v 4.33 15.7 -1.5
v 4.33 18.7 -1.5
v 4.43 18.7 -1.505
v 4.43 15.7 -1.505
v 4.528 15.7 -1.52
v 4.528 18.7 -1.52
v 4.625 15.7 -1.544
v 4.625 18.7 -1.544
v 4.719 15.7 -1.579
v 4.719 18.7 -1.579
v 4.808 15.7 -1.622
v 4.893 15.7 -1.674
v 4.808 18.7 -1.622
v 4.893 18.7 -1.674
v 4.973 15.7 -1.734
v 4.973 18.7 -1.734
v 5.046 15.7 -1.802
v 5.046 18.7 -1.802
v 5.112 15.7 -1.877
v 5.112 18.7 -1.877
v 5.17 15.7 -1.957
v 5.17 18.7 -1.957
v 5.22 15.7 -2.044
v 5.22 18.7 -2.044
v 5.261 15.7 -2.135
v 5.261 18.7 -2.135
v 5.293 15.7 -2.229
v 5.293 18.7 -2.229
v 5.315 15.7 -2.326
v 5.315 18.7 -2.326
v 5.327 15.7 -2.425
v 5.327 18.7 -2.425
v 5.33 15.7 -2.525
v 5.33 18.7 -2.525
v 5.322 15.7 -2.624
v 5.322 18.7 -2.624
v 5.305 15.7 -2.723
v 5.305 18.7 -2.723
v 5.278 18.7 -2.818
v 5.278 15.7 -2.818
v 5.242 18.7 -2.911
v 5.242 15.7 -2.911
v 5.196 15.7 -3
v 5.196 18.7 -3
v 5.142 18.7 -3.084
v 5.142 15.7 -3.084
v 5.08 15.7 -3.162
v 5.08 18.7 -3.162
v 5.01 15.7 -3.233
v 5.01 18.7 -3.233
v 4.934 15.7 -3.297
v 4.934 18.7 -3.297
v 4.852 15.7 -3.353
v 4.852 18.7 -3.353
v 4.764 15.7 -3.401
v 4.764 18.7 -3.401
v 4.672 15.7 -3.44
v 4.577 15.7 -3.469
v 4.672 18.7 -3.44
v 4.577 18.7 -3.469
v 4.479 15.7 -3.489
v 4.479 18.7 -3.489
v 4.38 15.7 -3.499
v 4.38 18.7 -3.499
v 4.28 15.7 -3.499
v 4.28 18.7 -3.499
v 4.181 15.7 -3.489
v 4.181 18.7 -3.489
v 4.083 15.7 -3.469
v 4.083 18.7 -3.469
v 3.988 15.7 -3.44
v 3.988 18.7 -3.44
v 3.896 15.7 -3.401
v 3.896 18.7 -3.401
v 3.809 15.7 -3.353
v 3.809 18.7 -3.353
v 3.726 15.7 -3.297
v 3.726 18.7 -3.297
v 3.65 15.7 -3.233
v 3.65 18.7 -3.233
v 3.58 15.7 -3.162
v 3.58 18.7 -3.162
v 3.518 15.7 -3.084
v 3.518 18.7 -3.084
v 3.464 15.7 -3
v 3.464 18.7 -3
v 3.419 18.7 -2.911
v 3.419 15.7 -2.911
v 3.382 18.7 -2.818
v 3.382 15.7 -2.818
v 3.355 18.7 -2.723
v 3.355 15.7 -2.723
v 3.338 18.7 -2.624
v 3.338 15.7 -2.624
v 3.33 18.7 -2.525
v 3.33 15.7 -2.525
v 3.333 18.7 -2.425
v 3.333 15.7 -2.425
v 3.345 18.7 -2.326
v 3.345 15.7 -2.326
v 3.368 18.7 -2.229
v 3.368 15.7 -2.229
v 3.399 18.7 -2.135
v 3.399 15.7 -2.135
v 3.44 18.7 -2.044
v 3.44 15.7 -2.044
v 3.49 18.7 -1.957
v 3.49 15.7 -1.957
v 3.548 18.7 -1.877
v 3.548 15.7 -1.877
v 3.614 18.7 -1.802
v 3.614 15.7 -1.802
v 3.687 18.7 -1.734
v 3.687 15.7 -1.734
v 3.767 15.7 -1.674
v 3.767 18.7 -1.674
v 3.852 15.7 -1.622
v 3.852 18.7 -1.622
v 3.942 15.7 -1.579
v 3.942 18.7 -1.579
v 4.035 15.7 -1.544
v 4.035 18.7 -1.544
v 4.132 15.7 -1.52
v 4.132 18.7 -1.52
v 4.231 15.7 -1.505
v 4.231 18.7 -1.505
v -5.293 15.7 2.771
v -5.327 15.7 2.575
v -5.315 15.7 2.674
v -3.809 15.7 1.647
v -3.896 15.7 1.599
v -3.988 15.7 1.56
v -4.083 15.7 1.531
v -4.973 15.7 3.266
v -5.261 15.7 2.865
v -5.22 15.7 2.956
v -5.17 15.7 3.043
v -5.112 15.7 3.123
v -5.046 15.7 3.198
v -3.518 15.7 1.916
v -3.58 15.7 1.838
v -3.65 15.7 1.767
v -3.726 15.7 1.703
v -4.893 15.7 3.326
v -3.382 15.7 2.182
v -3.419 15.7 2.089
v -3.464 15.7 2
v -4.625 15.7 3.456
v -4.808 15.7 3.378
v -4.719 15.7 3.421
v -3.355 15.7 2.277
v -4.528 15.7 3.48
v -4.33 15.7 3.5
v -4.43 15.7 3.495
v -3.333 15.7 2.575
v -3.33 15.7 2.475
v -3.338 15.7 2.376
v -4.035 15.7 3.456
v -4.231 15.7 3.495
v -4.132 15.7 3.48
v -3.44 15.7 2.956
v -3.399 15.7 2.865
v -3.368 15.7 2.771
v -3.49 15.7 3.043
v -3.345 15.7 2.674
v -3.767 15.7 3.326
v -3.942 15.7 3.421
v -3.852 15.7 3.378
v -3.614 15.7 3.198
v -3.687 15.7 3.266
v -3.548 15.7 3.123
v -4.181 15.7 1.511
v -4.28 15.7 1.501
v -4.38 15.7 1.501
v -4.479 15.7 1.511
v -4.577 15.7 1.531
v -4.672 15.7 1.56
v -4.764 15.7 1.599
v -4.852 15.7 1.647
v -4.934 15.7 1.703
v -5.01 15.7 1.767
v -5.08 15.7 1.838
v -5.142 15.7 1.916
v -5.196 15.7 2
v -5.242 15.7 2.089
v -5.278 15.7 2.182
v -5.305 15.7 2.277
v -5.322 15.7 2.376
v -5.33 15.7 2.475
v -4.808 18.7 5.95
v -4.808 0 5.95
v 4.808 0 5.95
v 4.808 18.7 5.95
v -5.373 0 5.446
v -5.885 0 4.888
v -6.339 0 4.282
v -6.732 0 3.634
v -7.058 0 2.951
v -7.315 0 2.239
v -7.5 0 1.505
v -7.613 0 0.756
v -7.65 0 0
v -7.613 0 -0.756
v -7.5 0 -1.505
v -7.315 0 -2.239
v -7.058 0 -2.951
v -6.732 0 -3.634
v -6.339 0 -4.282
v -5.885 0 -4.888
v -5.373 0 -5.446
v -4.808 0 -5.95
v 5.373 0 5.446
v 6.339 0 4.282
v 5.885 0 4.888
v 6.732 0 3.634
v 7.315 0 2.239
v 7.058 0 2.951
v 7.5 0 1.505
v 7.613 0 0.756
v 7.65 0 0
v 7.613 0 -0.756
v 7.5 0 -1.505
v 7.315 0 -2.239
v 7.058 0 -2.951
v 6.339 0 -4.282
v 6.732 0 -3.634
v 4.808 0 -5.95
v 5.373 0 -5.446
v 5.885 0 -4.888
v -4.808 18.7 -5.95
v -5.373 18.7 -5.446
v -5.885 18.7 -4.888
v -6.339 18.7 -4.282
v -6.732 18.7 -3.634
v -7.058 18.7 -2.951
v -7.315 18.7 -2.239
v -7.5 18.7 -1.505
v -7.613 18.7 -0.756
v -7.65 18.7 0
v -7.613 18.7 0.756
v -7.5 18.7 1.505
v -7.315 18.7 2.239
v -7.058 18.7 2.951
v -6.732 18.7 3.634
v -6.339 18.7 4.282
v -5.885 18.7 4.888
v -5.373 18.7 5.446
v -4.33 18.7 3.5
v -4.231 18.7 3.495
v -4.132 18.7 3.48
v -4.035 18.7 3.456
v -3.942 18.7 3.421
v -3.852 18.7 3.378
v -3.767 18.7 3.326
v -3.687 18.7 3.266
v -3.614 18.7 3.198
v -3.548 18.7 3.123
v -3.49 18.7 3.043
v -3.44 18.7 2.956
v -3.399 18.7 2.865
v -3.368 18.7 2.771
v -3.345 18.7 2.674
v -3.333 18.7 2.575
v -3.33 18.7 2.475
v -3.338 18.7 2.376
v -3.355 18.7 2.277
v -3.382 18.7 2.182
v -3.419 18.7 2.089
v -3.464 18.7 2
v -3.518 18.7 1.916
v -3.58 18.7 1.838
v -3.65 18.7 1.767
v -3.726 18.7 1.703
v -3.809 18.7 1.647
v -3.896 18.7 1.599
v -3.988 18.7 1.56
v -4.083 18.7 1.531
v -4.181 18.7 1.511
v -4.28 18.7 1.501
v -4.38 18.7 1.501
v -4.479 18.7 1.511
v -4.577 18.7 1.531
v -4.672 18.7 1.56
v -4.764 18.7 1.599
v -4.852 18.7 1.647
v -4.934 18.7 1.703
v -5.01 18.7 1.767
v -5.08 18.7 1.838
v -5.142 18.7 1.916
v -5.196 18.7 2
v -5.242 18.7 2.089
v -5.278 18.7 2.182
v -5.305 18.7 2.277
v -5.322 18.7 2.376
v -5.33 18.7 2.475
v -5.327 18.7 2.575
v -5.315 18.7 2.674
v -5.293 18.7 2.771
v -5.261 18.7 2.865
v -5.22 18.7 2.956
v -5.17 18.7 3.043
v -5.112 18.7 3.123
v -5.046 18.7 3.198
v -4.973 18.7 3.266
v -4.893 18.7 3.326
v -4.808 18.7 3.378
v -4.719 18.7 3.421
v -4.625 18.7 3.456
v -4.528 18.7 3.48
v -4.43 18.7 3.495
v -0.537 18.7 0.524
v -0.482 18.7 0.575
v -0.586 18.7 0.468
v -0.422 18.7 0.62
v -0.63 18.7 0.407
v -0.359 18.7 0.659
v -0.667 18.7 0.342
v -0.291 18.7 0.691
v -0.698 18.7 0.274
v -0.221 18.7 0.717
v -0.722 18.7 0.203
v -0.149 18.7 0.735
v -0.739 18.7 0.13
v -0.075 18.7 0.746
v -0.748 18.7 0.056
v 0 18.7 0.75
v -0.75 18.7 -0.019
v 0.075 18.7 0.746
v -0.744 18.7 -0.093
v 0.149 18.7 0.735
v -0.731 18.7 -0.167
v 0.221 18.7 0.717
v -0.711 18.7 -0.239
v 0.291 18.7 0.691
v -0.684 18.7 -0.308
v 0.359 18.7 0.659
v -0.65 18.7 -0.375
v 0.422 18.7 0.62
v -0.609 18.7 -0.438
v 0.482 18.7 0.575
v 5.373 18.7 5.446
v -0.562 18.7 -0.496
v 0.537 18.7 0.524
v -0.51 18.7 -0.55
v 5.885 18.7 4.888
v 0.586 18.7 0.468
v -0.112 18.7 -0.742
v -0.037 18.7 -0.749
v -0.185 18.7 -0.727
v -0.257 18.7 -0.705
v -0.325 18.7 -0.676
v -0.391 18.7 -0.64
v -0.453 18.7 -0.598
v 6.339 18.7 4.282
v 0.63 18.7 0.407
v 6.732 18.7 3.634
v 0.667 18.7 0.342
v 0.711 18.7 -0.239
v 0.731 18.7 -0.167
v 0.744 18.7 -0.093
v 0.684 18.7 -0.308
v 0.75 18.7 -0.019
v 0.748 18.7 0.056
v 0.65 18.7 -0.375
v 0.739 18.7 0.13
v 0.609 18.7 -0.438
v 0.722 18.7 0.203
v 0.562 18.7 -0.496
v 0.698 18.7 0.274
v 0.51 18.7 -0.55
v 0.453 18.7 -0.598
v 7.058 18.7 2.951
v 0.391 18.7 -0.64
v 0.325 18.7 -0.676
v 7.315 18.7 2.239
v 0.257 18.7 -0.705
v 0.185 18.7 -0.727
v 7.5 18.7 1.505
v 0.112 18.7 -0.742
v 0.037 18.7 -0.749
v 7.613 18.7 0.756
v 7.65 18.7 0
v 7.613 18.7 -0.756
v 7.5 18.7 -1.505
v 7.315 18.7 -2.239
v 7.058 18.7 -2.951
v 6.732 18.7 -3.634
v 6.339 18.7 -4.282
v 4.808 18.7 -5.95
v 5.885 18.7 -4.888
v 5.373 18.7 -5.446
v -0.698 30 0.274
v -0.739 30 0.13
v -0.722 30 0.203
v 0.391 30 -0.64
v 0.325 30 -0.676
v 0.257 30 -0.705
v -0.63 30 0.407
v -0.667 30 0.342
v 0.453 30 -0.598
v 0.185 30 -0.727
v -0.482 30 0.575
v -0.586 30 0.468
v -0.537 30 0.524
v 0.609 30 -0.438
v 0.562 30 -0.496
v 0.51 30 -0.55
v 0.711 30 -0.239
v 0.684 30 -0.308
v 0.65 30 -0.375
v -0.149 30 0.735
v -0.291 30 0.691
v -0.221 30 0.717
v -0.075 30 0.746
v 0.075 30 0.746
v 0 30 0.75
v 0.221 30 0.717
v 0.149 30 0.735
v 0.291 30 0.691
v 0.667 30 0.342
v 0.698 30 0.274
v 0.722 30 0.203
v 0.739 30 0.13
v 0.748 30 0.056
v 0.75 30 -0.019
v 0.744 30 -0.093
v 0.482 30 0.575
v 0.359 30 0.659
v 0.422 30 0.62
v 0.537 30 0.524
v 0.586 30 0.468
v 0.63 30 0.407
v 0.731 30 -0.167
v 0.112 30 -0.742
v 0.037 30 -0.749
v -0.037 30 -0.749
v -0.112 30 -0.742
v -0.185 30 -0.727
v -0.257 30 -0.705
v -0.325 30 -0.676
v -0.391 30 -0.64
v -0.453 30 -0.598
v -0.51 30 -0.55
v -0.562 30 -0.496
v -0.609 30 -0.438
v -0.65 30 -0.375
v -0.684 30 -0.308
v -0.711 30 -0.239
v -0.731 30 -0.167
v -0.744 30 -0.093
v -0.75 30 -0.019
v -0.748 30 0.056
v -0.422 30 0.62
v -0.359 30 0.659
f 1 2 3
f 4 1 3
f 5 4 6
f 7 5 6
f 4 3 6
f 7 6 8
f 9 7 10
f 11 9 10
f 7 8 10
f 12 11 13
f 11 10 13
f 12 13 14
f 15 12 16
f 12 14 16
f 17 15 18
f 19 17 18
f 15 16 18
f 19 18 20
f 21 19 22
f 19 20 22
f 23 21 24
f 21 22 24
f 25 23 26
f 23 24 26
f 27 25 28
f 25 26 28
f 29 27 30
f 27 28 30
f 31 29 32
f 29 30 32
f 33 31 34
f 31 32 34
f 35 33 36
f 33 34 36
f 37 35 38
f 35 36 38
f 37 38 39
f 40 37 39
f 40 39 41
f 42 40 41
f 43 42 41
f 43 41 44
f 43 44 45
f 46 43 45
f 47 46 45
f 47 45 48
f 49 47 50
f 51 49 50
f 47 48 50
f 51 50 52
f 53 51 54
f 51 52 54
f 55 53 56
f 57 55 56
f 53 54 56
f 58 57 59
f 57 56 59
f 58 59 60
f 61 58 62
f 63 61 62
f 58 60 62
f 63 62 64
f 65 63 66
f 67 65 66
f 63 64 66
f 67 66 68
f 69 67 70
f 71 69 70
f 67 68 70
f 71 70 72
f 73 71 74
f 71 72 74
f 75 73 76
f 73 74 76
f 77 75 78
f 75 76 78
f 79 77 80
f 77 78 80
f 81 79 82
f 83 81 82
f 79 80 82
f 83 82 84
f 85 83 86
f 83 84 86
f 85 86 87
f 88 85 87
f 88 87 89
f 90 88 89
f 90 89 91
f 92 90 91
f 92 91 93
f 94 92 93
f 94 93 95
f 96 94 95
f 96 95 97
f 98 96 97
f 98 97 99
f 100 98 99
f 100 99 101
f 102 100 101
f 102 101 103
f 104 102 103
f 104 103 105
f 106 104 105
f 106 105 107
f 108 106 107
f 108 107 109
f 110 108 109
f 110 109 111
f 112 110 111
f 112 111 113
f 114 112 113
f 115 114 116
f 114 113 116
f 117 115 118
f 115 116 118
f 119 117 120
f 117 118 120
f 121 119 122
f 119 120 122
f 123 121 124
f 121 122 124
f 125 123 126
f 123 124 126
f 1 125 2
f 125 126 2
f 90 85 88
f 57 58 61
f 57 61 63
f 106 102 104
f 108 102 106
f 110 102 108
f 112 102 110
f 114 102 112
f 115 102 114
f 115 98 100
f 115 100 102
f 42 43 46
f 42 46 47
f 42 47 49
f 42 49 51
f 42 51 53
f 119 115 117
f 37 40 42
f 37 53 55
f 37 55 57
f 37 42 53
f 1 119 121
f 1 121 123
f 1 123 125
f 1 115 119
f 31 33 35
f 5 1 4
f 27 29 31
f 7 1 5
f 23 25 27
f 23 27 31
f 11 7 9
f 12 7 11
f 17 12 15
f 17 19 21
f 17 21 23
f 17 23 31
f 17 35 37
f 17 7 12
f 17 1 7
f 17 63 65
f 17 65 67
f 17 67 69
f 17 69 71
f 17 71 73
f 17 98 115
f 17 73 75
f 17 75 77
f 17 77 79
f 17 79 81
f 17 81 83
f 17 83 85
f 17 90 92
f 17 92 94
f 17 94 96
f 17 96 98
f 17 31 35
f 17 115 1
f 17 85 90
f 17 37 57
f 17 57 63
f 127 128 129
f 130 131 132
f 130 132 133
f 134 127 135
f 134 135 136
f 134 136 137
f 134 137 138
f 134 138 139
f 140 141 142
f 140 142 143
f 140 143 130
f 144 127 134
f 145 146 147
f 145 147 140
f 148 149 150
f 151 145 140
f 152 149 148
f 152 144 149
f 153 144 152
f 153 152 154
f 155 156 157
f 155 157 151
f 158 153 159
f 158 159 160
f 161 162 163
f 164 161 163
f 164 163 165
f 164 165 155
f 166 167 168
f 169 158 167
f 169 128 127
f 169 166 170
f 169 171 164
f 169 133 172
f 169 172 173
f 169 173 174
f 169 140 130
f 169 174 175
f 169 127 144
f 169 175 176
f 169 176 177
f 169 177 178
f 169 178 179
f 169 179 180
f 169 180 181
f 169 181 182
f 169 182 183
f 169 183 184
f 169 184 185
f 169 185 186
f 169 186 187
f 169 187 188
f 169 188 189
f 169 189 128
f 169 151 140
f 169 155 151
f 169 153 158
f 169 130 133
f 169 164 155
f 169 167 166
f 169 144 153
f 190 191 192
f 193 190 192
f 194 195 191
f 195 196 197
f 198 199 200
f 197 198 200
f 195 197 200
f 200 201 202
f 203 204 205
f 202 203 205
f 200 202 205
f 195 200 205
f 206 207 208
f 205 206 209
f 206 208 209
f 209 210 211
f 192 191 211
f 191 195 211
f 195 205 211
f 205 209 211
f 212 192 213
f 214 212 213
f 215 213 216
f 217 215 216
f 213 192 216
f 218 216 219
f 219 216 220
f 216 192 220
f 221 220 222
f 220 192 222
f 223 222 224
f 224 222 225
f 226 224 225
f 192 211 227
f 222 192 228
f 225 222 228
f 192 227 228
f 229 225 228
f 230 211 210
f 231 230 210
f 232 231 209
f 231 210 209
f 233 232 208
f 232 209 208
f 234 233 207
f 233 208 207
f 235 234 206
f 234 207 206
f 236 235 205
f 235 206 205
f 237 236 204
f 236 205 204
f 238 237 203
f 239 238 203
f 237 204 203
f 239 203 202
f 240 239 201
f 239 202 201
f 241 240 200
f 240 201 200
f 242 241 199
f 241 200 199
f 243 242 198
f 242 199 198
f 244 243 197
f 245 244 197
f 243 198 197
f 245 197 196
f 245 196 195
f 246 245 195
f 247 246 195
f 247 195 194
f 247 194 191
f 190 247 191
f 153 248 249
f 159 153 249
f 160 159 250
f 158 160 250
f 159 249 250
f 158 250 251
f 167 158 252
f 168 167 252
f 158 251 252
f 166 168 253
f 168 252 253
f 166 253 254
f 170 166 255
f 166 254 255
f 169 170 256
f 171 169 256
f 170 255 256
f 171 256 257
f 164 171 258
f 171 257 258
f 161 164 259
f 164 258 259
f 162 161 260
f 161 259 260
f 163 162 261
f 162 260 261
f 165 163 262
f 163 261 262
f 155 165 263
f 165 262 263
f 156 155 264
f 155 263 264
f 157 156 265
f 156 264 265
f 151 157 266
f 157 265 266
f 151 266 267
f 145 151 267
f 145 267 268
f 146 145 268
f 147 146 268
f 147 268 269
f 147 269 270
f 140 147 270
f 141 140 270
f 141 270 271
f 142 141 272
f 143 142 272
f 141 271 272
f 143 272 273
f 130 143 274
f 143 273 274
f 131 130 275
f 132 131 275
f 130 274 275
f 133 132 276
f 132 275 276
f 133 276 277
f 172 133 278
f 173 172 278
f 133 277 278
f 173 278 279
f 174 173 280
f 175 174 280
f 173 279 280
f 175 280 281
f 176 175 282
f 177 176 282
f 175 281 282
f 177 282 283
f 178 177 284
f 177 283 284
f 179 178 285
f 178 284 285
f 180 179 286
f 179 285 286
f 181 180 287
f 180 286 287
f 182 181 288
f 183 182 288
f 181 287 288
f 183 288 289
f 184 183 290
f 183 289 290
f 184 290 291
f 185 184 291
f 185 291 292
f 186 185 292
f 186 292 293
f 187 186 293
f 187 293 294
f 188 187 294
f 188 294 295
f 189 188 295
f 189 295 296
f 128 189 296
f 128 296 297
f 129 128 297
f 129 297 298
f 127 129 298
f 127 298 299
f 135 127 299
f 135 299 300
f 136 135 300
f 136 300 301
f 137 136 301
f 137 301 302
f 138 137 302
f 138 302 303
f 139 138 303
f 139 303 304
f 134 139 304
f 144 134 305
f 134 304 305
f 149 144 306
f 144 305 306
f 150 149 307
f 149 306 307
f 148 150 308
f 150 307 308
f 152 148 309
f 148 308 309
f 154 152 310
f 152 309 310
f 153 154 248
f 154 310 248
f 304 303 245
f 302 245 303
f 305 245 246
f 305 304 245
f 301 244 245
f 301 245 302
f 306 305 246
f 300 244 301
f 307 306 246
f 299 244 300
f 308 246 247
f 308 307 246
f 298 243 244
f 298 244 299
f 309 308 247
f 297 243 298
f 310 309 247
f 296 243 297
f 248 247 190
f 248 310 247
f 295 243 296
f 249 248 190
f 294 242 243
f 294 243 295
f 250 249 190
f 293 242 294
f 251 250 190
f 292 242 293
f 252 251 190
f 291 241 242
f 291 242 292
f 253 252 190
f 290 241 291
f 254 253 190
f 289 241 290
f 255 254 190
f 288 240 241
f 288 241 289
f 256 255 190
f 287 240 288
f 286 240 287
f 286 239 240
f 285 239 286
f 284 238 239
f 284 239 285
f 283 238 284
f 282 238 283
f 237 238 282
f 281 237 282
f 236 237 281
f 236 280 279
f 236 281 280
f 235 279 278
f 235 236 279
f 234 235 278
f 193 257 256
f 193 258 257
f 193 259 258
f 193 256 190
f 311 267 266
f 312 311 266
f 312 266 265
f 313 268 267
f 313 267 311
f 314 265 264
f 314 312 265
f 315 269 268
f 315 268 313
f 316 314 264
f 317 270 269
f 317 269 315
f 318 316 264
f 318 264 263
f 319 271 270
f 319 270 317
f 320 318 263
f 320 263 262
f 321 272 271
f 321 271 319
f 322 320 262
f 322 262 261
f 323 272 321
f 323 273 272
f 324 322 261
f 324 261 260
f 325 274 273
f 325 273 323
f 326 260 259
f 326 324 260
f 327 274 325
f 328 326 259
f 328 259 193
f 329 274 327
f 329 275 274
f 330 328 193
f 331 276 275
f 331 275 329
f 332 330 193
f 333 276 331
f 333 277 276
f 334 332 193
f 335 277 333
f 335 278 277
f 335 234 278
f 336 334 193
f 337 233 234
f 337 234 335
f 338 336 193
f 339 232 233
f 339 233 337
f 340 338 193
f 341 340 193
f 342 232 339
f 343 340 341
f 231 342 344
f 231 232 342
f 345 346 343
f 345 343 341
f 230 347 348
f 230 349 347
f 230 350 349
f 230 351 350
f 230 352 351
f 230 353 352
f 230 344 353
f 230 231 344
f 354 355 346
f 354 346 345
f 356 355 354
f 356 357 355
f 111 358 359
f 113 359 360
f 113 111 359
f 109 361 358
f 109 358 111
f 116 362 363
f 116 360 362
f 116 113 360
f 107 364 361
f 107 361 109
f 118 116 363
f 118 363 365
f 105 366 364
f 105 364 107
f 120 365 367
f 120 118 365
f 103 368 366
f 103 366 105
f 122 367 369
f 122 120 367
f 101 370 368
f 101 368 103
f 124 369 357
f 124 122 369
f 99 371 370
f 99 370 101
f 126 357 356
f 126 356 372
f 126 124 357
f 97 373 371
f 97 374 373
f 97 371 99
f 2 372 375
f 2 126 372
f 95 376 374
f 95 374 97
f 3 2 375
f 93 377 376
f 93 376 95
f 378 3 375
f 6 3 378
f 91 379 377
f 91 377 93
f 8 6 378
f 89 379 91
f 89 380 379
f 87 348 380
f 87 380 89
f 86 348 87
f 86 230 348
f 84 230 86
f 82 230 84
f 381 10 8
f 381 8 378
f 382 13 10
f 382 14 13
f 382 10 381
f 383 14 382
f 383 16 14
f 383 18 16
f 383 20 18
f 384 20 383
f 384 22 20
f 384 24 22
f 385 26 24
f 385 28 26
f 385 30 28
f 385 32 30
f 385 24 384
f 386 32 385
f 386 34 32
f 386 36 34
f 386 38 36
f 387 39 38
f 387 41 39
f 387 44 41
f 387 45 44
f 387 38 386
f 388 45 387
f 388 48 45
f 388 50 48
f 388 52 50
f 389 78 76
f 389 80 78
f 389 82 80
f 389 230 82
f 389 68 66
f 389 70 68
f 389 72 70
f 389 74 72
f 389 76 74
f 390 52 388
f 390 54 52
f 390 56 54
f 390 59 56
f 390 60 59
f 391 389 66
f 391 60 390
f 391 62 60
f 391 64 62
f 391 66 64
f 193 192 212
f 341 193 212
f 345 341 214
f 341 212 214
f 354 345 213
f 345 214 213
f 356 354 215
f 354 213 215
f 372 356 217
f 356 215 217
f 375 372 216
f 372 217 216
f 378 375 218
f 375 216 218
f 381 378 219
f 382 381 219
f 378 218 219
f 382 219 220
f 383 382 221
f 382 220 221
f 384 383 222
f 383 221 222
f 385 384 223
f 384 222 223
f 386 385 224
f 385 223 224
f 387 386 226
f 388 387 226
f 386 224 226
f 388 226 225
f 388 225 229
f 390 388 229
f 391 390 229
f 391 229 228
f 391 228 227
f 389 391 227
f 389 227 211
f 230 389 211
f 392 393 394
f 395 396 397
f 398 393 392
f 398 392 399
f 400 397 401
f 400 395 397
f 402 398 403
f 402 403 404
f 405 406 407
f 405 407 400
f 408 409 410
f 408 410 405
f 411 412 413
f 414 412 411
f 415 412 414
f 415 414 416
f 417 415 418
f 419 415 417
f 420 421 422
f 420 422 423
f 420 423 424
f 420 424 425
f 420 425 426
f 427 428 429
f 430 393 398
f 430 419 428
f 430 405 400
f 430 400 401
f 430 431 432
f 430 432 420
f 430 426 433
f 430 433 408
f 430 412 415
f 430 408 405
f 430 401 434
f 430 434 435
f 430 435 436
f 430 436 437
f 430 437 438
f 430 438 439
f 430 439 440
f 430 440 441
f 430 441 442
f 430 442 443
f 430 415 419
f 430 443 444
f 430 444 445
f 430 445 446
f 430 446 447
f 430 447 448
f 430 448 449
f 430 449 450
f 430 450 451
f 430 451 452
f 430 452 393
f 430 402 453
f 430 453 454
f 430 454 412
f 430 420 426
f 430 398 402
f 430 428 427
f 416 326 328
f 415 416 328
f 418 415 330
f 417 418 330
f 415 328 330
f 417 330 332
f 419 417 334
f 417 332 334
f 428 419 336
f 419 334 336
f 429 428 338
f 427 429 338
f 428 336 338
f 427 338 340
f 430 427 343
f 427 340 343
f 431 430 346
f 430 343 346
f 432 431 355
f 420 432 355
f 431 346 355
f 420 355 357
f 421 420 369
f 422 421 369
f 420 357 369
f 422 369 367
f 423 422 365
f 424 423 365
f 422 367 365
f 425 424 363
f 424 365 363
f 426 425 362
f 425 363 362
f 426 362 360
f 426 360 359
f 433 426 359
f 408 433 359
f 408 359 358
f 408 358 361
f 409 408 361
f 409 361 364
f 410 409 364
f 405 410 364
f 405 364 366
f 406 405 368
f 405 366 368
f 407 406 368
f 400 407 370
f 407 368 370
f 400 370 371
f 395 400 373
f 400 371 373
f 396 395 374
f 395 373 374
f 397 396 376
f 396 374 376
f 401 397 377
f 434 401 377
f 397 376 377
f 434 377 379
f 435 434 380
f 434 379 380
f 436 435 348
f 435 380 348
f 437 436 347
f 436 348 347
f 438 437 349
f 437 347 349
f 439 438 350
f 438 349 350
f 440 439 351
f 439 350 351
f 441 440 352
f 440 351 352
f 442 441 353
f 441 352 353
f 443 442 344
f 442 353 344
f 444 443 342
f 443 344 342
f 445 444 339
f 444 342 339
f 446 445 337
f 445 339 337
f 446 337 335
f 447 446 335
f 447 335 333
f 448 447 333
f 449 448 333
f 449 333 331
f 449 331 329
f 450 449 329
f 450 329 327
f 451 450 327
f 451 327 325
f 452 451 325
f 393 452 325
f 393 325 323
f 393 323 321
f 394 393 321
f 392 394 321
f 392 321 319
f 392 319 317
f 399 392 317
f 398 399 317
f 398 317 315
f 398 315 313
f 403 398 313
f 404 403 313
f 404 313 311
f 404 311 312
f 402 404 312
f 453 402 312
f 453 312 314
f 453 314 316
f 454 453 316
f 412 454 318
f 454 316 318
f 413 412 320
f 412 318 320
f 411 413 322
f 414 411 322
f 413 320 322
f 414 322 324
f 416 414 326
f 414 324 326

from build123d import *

# Parameters (mm, degrees)
EXTRUDE_1_DEPTH     = 18.7
SKETCH_2_R          = 0.75
EXTRUDE_2_DEPTH     = 11.3
SKETCH_3_R          = 1
CUT_EXTRUDE_1_DEPTH = 3


with BuildPart() as part:
    # 草图1 → 凸台-拉伸1 (new body)
    with BuildSketch(Plane(origin=(0, 0, 0), x_dir=(1, 0, 0), z_dir=(0, 1, 0))):
        with BuildLine():
            Line((4.808326112, 5.95), (-4.808326112, 5.95))
            ThreePointArc((-4.808326112, 5.95), (-7.65, 0), (-4.808326112, -5.95))
            Line((-4.808326112, -5.95), (4.808326112, -5.95))
            ThreePointArc((4.808326112, -5.95), (7.65, 0), (4.808326112, 5.95))
        make_face()
    extrude(amount=EXTRUDE_1_DEPTH)

    # 草图2 → 凸台-拉伸2 (add)
    with BuildSketch(Plane(origin=(0, 18.7, 0), x_dir=(1, 0, 0), z_dir=(0, 1, 0))):
        with Locations(Location((0, 0, 0), (0, 0, 270))):
            Circle(SKETCH_2_R)
    extrude(amount=EXTRUDE_2_DEPTH)

    # 草图3 → 切除-拉伸1 (cut)
    with BuildSketch(Plane(origin=(0, 18.7, 0), x_dir=(1, 0, 0), z_dir=(0, 1, 0))):
        with Locations(Location((4.330127019, 2.5, 0), (0, 0, 270))):
            Circle(SKETCH_3_R)
        with Locations(Location((-4.330127019, -2.5, 0), (0, 0, 270))):
            Circle(SKETCH_3_R)
    extrude(amount=-CUT_EXTRUDE_1_DEPTH, mode=Mode.SUBTRACT)


solid = part.part
